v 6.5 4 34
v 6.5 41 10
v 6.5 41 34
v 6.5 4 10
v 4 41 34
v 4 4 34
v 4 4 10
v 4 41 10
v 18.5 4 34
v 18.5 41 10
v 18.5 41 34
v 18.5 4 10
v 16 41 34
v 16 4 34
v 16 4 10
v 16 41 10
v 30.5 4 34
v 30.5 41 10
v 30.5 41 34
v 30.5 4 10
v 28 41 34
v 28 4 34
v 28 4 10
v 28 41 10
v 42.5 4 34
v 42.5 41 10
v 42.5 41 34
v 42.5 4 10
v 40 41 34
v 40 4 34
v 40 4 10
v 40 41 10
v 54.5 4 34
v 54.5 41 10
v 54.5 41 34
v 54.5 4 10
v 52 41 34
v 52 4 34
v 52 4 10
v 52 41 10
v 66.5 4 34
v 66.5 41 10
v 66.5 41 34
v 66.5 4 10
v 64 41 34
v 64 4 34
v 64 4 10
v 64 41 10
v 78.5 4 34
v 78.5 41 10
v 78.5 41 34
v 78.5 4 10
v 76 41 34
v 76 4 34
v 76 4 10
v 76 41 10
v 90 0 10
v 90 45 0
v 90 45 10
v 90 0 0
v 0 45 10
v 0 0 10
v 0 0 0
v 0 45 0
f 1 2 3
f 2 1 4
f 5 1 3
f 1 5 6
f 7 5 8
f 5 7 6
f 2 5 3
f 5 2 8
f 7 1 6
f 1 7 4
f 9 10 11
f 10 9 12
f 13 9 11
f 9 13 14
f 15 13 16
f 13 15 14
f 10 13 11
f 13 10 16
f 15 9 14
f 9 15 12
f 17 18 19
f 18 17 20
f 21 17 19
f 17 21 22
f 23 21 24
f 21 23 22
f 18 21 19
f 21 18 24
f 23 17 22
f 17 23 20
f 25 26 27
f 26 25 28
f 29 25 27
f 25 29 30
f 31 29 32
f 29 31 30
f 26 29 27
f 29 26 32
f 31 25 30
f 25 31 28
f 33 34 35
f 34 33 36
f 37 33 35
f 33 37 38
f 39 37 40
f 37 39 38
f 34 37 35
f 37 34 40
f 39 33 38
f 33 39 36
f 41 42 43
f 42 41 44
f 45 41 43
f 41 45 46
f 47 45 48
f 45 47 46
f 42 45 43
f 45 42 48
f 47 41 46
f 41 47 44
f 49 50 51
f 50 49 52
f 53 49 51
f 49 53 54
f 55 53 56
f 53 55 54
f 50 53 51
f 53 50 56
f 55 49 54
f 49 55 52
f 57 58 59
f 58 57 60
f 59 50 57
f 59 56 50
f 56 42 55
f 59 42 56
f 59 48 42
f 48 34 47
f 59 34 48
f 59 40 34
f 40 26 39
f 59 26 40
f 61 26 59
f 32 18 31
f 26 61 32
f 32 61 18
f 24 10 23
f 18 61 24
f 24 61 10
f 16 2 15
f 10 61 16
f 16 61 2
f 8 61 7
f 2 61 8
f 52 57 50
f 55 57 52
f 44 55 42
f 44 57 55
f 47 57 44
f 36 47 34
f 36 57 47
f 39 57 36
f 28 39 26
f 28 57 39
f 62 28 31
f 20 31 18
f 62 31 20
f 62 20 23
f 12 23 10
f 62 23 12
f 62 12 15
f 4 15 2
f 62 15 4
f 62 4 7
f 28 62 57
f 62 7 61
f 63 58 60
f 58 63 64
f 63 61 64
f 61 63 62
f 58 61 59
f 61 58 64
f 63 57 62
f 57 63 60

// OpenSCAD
$fn = 32;

// ----------------------------------------------------------------------
// Heatsink: uniform fin block
// ----------------------------------------------------------------------

// --- parameters (mm) ---
base_l = 90;              // base length, X
base_w = 45;              // base width, Y
base_t = 10;              // base plate thickness
fin_h = 25;               // fin height above the base
fin_t = 2.5;              // fin thickness
edge = 4;                 // margin from the base ends
pitch = 12;               // fin pitch

n_fins = floor((base_l - 2 * edge - fin_t) / pitch) + 1;  // fin count
total_h = base_t + fin_h - 1;  // overall height

union() {
  cube([base_l, base_w, base_t]);
  for (i = [0 : n_fins - 1])
    translate([edge + i * pitch, edge, base_t - 1])
      cube([fin_t, base_w - 2 * edge, fin_h]);
}
